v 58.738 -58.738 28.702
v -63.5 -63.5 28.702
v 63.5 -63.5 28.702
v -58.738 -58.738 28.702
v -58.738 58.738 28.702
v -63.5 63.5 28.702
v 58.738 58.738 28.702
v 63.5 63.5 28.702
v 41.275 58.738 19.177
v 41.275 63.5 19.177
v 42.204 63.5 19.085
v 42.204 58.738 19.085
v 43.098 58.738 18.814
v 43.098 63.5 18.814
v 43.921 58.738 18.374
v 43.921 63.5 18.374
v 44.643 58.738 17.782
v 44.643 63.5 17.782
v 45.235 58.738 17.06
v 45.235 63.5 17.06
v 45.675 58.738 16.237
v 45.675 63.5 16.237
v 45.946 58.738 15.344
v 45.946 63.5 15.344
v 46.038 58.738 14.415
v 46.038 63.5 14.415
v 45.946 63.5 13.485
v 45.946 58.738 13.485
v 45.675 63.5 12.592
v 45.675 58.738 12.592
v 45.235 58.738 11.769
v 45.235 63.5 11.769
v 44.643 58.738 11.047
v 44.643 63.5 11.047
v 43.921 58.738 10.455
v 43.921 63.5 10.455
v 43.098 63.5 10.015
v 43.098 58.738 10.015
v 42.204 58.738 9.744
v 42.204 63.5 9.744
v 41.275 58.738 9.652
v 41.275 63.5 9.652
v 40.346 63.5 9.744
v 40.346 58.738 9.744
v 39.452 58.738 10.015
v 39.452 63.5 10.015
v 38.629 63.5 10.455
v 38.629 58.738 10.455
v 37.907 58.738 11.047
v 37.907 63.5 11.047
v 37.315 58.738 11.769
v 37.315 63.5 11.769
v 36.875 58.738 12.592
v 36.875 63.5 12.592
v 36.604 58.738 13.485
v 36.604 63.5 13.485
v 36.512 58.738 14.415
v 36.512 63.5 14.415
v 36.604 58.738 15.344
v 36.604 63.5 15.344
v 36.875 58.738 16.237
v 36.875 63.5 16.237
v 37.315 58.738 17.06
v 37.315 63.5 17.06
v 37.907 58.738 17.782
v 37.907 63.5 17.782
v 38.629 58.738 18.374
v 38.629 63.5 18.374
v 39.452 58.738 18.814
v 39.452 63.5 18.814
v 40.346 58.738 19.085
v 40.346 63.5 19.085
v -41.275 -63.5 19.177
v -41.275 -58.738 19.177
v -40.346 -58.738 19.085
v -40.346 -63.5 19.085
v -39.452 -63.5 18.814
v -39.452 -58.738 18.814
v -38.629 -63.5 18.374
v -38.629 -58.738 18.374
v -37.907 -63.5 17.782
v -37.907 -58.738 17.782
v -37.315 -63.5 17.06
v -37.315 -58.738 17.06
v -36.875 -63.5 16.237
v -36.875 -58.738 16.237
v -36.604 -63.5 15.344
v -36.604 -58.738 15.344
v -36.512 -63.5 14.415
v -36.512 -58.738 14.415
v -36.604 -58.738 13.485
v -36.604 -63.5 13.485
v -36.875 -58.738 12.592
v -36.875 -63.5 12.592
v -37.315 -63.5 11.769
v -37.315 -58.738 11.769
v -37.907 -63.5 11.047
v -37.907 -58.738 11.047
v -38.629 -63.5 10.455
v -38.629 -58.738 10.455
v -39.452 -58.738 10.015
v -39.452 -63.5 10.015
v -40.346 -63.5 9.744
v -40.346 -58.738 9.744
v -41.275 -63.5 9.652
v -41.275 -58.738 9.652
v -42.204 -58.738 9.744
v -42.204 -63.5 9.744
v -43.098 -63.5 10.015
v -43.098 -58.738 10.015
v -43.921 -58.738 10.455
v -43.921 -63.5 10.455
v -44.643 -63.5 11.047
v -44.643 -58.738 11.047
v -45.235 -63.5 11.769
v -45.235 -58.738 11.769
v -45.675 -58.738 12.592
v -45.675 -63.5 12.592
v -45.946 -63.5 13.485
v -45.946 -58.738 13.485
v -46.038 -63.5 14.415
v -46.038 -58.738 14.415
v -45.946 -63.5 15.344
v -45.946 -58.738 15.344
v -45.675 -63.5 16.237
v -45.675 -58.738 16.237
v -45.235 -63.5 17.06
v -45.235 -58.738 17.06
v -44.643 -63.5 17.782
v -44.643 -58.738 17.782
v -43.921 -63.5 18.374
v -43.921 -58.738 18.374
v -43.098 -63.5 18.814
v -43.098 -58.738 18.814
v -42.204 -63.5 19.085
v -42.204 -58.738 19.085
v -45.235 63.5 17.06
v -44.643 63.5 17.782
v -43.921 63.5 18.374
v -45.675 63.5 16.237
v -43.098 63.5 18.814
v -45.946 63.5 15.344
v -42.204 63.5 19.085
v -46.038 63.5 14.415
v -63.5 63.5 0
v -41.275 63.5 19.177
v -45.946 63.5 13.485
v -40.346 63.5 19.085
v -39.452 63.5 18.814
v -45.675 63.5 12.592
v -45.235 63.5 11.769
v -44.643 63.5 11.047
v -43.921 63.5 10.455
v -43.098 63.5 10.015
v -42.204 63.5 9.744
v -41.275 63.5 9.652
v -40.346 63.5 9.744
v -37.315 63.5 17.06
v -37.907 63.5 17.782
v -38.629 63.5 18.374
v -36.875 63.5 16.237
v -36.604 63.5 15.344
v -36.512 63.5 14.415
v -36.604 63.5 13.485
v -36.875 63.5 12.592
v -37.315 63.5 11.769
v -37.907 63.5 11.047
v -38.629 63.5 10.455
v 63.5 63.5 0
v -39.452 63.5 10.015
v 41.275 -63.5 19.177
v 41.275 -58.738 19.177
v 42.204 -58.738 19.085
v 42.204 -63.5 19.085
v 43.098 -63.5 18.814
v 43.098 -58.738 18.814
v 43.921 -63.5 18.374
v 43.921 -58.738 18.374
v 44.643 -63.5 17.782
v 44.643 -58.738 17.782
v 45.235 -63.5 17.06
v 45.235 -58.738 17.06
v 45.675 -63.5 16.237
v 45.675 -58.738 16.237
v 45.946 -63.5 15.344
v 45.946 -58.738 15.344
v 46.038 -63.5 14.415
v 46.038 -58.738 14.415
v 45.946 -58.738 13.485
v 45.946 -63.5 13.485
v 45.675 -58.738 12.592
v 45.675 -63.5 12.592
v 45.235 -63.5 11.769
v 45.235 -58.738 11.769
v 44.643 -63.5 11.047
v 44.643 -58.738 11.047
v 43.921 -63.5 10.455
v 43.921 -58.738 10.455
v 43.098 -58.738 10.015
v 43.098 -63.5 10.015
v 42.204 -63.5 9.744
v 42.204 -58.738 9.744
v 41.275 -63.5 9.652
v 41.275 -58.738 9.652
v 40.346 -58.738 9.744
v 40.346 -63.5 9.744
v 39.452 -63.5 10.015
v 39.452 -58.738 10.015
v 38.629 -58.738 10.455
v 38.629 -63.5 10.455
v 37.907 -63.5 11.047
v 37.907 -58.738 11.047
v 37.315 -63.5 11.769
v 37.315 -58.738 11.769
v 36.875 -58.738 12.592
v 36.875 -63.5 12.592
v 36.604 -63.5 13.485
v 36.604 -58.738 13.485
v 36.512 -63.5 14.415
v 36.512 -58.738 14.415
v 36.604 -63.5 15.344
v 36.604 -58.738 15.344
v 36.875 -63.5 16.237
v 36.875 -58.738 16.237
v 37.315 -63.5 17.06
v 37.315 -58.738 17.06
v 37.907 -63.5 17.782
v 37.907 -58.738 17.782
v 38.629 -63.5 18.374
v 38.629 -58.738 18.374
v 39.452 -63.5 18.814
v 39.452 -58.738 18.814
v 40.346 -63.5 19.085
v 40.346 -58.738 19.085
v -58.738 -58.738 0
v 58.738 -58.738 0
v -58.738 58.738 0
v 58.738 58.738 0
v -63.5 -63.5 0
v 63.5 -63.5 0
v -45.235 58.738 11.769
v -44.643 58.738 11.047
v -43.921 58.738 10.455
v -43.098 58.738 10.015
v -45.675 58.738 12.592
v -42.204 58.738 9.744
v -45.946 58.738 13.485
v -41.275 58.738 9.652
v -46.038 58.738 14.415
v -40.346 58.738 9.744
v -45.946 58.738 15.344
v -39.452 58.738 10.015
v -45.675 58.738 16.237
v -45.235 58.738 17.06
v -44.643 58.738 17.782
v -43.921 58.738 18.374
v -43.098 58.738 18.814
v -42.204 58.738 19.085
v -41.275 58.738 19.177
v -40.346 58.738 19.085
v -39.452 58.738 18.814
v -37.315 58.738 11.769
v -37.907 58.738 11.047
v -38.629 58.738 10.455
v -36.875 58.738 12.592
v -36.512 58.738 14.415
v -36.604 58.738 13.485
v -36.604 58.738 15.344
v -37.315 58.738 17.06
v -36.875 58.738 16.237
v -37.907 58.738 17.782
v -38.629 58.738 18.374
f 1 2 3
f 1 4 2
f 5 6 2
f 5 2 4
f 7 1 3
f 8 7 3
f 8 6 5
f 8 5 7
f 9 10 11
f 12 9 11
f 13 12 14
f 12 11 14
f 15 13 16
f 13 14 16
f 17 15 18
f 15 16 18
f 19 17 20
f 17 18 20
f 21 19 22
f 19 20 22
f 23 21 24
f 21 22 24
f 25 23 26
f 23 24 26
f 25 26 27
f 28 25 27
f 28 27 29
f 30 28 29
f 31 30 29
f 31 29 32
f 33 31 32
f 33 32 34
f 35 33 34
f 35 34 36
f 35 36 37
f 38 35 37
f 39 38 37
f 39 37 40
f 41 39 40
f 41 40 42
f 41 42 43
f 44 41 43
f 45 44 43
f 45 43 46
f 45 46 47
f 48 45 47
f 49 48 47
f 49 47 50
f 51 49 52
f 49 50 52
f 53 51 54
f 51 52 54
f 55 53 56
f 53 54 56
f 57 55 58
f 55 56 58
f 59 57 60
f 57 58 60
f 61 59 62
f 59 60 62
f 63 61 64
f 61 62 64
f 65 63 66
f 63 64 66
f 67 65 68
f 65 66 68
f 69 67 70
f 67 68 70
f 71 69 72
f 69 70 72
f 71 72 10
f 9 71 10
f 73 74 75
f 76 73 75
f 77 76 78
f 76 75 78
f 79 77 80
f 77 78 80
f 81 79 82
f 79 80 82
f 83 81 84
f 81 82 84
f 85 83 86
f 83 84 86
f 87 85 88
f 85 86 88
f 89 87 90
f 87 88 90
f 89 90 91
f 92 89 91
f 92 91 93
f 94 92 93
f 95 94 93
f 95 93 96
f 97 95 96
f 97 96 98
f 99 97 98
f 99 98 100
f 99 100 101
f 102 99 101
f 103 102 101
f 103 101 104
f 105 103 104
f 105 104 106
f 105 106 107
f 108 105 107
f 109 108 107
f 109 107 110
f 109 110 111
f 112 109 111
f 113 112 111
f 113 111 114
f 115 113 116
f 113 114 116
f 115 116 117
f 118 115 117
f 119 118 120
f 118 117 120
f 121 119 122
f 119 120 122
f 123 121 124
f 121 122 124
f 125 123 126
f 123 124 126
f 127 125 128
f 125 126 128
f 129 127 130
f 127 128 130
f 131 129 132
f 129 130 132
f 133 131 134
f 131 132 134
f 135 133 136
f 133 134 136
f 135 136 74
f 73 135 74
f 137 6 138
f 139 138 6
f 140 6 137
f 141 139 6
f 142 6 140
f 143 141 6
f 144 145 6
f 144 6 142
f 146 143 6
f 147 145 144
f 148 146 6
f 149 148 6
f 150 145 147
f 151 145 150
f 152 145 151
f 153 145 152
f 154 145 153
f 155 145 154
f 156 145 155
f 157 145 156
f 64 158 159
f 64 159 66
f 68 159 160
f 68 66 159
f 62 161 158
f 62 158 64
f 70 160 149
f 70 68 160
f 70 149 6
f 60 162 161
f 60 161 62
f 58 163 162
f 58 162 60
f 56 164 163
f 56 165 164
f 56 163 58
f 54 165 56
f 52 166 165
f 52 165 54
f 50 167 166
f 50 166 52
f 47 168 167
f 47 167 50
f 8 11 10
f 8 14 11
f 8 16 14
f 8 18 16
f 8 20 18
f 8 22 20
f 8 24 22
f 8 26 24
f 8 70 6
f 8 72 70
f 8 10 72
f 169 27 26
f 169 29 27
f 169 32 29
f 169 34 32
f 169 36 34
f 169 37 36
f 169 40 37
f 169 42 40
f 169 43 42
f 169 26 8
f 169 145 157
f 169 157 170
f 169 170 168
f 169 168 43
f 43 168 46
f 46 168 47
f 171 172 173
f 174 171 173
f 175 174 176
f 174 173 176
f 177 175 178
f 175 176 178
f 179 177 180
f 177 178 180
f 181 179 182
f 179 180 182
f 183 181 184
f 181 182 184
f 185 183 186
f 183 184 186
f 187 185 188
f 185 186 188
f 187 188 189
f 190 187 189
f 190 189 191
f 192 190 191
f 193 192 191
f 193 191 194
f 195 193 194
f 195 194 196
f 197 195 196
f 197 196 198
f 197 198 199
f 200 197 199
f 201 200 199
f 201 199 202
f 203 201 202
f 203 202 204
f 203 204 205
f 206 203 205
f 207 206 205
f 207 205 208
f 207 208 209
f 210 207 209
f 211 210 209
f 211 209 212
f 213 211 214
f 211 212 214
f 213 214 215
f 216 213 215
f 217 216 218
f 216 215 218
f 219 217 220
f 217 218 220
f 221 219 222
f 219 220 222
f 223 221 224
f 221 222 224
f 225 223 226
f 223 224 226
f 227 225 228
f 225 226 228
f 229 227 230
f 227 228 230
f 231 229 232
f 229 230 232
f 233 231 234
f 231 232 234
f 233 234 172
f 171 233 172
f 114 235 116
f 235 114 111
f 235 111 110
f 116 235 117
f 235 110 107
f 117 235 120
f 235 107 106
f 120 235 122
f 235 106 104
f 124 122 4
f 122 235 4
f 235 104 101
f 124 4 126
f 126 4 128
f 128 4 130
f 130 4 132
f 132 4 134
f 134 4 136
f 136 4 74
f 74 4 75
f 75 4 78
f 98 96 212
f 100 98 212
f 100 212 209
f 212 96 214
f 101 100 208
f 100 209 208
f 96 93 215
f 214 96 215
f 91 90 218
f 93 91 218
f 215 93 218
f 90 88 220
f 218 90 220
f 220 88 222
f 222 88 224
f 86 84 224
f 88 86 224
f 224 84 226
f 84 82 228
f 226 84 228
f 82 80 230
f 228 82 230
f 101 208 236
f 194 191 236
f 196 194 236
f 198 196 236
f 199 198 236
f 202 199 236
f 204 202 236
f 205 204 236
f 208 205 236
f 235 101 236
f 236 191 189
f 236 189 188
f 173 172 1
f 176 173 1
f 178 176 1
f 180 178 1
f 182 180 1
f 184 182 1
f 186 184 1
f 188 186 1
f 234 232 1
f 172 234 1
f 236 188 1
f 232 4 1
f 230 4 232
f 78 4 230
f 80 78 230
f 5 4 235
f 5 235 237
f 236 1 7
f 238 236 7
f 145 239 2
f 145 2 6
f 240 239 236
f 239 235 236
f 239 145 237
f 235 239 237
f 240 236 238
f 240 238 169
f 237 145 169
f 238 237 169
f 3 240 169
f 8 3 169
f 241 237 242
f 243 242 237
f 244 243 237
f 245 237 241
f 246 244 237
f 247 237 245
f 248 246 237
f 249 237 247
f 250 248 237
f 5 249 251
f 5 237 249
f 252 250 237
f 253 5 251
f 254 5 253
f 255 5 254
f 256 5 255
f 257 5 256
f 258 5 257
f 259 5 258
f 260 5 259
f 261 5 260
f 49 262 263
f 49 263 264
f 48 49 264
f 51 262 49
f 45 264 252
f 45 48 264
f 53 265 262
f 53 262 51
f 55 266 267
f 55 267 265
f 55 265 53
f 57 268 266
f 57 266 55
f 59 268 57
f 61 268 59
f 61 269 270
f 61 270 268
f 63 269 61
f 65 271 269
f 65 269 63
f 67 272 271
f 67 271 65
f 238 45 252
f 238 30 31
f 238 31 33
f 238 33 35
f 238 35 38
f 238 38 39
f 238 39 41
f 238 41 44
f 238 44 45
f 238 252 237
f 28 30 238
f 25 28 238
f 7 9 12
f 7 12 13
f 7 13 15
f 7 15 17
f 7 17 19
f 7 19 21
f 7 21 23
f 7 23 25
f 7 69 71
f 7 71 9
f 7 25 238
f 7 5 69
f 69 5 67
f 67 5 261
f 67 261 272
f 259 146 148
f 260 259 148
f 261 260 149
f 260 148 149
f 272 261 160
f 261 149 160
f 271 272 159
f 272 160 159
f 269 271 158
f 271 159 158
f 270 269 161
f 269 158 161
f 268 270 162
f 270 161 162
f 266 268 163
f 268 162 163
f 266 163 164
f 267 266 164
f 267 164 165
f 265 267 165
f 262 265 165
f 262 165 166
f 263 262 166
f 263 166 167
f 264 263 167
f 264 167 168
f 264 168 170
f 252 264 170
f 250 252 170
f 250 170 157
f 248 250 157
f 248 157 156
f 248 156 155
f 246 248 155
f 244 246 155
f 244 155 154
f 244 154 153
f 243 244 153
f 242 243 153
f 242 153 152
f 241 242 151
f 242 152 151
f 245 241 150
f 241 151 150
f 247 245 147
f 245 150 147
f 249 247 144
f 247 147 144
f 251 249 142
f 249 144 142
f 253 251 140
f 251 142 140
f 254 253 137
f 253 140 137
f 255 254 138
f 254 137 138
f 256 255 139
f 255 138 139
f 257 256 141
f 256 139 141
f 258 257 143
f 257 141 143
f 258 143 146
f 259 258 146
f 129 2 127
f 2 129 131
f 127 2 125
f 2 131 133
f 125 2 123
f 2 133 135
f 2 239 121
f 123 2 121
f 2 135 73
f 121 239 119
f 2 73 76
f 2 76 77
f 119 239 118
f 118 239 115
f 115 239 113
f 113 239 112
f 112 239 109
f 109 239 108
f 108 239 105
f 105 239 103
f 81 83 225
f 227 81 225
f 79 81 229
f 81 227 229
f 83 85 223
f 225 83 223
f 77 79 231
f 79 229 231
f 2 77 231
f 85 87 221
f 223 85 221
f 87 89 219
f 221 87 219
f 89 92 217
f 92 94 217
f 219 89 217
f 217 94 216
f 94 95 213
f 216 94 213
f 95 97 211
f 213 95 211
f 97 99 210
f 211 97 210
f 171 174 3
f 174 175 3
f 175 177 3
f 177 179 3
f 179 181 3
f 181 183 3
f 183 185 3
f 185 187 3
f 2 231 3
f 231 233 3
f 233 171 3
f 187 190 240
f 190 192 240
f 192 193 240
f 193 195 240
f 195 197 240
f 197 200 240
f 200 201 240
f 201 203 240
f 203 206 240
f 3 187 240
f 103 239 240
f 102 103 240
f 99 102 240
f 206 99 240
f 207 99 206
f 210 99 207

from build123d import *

# Parameters (mm, degrees)
SKETCH2_W           = 127
SKETCH2_H           = 127
BOSS_EXTRUDE1_DEPTH = 28.702
SKETCH3_W           = 117.475
SKETCH3_H           = 117.475
CUT_EXTRUDE1_DEPTH  = 28.702
CUT_EXTRUDE2_REACH  = 146.862
SKETCH4_R           = 4.7625


with BuildPart() as part:
    # Sketch2 → Boss-Extrude1 (new body)
    with BuildSketch(Plane.XY):
        Rectangle(SKETCH2_W, SKETCH2_H)
    extrude(amount=BOSS_EXTRUDE1_DEPTH)

    # Sketch3 → Cut-Extrude1 (cut)
    with BuildSketch(Plane.XY.offset(28.702)):
        Rectangle(SKETCH3_W, SKETCH3_H)
    extrude(amount=-CUT_EXTRUDE1_DEPTH, mode=Mode.SUBTRACT)

    # Cut-Extrude2: up to this face of the body (flat: up to its plane)
    cut_extrude2_end = Plane(part.part.faces().sort_by_distance((0, -63.5, 14.351))[0])
    # Sketch4 → Cut-Extrude2 (cut, up to the picked face)
    with BuildSketch(Plane(origin=(0, 63.5, 0), x_dir=(1, 0, 0), z_dir=(0, 1, 0)), mode=Mode.PRIVATE) as cut_extrude2_sk1:
        with Locations(Location((41.275, -14.4145, 0), (0, 0, 270))):
            Circle(SKETCH4_R)
    cut_extrude2_tool1 = split(extrude(cut_extrude2_sk1.sketch, amount=-CUT_EXTRUDE2_REACH, mode=Mode.PRIVATE), bisect_by=cut_extrude2_end, keep=Keep.BOTH, mode=Mode.PRIVATE)
    # Sketch4 → Cut-Extrude2 (cut, up to the picked face)
    with BuildSketch(Plane(origin=(0, 63.5, 0), x_dir=(1, 0, 0), z_dir=(0, 1, 0)), mode=Mode.PRIVATE) as cut_extrude2_sk2:
        with Locations(Location((-41.275, -14.4145, 0), (0, 0, 270))):
            Circle(SKETCH4_R)
    cut_extrude2_tool2 = split(extrude(cut_extrude2_sk2.sketch, amount=-CUT_EXTRUDE2_REACH, mode=Mode.PRIVATE), bisect_by=cut_extrude2_end, keep=Keep.BOTH, mode=Mode.PRIVATE)
    add(cut_extrude2_tool1.solids().sort_by(Axis((41.275, 63.5, 14.4145), (0, -1, 0)))[0], mode=Mode.SUBTRACT)
    add(cut_extrude2_tool2.solids().sort_by(Axis((-41.275, 63.5, 14.4145), (0, -1, 0)))[0], mode=Mode.SUBTRACT)


solid = part.part
